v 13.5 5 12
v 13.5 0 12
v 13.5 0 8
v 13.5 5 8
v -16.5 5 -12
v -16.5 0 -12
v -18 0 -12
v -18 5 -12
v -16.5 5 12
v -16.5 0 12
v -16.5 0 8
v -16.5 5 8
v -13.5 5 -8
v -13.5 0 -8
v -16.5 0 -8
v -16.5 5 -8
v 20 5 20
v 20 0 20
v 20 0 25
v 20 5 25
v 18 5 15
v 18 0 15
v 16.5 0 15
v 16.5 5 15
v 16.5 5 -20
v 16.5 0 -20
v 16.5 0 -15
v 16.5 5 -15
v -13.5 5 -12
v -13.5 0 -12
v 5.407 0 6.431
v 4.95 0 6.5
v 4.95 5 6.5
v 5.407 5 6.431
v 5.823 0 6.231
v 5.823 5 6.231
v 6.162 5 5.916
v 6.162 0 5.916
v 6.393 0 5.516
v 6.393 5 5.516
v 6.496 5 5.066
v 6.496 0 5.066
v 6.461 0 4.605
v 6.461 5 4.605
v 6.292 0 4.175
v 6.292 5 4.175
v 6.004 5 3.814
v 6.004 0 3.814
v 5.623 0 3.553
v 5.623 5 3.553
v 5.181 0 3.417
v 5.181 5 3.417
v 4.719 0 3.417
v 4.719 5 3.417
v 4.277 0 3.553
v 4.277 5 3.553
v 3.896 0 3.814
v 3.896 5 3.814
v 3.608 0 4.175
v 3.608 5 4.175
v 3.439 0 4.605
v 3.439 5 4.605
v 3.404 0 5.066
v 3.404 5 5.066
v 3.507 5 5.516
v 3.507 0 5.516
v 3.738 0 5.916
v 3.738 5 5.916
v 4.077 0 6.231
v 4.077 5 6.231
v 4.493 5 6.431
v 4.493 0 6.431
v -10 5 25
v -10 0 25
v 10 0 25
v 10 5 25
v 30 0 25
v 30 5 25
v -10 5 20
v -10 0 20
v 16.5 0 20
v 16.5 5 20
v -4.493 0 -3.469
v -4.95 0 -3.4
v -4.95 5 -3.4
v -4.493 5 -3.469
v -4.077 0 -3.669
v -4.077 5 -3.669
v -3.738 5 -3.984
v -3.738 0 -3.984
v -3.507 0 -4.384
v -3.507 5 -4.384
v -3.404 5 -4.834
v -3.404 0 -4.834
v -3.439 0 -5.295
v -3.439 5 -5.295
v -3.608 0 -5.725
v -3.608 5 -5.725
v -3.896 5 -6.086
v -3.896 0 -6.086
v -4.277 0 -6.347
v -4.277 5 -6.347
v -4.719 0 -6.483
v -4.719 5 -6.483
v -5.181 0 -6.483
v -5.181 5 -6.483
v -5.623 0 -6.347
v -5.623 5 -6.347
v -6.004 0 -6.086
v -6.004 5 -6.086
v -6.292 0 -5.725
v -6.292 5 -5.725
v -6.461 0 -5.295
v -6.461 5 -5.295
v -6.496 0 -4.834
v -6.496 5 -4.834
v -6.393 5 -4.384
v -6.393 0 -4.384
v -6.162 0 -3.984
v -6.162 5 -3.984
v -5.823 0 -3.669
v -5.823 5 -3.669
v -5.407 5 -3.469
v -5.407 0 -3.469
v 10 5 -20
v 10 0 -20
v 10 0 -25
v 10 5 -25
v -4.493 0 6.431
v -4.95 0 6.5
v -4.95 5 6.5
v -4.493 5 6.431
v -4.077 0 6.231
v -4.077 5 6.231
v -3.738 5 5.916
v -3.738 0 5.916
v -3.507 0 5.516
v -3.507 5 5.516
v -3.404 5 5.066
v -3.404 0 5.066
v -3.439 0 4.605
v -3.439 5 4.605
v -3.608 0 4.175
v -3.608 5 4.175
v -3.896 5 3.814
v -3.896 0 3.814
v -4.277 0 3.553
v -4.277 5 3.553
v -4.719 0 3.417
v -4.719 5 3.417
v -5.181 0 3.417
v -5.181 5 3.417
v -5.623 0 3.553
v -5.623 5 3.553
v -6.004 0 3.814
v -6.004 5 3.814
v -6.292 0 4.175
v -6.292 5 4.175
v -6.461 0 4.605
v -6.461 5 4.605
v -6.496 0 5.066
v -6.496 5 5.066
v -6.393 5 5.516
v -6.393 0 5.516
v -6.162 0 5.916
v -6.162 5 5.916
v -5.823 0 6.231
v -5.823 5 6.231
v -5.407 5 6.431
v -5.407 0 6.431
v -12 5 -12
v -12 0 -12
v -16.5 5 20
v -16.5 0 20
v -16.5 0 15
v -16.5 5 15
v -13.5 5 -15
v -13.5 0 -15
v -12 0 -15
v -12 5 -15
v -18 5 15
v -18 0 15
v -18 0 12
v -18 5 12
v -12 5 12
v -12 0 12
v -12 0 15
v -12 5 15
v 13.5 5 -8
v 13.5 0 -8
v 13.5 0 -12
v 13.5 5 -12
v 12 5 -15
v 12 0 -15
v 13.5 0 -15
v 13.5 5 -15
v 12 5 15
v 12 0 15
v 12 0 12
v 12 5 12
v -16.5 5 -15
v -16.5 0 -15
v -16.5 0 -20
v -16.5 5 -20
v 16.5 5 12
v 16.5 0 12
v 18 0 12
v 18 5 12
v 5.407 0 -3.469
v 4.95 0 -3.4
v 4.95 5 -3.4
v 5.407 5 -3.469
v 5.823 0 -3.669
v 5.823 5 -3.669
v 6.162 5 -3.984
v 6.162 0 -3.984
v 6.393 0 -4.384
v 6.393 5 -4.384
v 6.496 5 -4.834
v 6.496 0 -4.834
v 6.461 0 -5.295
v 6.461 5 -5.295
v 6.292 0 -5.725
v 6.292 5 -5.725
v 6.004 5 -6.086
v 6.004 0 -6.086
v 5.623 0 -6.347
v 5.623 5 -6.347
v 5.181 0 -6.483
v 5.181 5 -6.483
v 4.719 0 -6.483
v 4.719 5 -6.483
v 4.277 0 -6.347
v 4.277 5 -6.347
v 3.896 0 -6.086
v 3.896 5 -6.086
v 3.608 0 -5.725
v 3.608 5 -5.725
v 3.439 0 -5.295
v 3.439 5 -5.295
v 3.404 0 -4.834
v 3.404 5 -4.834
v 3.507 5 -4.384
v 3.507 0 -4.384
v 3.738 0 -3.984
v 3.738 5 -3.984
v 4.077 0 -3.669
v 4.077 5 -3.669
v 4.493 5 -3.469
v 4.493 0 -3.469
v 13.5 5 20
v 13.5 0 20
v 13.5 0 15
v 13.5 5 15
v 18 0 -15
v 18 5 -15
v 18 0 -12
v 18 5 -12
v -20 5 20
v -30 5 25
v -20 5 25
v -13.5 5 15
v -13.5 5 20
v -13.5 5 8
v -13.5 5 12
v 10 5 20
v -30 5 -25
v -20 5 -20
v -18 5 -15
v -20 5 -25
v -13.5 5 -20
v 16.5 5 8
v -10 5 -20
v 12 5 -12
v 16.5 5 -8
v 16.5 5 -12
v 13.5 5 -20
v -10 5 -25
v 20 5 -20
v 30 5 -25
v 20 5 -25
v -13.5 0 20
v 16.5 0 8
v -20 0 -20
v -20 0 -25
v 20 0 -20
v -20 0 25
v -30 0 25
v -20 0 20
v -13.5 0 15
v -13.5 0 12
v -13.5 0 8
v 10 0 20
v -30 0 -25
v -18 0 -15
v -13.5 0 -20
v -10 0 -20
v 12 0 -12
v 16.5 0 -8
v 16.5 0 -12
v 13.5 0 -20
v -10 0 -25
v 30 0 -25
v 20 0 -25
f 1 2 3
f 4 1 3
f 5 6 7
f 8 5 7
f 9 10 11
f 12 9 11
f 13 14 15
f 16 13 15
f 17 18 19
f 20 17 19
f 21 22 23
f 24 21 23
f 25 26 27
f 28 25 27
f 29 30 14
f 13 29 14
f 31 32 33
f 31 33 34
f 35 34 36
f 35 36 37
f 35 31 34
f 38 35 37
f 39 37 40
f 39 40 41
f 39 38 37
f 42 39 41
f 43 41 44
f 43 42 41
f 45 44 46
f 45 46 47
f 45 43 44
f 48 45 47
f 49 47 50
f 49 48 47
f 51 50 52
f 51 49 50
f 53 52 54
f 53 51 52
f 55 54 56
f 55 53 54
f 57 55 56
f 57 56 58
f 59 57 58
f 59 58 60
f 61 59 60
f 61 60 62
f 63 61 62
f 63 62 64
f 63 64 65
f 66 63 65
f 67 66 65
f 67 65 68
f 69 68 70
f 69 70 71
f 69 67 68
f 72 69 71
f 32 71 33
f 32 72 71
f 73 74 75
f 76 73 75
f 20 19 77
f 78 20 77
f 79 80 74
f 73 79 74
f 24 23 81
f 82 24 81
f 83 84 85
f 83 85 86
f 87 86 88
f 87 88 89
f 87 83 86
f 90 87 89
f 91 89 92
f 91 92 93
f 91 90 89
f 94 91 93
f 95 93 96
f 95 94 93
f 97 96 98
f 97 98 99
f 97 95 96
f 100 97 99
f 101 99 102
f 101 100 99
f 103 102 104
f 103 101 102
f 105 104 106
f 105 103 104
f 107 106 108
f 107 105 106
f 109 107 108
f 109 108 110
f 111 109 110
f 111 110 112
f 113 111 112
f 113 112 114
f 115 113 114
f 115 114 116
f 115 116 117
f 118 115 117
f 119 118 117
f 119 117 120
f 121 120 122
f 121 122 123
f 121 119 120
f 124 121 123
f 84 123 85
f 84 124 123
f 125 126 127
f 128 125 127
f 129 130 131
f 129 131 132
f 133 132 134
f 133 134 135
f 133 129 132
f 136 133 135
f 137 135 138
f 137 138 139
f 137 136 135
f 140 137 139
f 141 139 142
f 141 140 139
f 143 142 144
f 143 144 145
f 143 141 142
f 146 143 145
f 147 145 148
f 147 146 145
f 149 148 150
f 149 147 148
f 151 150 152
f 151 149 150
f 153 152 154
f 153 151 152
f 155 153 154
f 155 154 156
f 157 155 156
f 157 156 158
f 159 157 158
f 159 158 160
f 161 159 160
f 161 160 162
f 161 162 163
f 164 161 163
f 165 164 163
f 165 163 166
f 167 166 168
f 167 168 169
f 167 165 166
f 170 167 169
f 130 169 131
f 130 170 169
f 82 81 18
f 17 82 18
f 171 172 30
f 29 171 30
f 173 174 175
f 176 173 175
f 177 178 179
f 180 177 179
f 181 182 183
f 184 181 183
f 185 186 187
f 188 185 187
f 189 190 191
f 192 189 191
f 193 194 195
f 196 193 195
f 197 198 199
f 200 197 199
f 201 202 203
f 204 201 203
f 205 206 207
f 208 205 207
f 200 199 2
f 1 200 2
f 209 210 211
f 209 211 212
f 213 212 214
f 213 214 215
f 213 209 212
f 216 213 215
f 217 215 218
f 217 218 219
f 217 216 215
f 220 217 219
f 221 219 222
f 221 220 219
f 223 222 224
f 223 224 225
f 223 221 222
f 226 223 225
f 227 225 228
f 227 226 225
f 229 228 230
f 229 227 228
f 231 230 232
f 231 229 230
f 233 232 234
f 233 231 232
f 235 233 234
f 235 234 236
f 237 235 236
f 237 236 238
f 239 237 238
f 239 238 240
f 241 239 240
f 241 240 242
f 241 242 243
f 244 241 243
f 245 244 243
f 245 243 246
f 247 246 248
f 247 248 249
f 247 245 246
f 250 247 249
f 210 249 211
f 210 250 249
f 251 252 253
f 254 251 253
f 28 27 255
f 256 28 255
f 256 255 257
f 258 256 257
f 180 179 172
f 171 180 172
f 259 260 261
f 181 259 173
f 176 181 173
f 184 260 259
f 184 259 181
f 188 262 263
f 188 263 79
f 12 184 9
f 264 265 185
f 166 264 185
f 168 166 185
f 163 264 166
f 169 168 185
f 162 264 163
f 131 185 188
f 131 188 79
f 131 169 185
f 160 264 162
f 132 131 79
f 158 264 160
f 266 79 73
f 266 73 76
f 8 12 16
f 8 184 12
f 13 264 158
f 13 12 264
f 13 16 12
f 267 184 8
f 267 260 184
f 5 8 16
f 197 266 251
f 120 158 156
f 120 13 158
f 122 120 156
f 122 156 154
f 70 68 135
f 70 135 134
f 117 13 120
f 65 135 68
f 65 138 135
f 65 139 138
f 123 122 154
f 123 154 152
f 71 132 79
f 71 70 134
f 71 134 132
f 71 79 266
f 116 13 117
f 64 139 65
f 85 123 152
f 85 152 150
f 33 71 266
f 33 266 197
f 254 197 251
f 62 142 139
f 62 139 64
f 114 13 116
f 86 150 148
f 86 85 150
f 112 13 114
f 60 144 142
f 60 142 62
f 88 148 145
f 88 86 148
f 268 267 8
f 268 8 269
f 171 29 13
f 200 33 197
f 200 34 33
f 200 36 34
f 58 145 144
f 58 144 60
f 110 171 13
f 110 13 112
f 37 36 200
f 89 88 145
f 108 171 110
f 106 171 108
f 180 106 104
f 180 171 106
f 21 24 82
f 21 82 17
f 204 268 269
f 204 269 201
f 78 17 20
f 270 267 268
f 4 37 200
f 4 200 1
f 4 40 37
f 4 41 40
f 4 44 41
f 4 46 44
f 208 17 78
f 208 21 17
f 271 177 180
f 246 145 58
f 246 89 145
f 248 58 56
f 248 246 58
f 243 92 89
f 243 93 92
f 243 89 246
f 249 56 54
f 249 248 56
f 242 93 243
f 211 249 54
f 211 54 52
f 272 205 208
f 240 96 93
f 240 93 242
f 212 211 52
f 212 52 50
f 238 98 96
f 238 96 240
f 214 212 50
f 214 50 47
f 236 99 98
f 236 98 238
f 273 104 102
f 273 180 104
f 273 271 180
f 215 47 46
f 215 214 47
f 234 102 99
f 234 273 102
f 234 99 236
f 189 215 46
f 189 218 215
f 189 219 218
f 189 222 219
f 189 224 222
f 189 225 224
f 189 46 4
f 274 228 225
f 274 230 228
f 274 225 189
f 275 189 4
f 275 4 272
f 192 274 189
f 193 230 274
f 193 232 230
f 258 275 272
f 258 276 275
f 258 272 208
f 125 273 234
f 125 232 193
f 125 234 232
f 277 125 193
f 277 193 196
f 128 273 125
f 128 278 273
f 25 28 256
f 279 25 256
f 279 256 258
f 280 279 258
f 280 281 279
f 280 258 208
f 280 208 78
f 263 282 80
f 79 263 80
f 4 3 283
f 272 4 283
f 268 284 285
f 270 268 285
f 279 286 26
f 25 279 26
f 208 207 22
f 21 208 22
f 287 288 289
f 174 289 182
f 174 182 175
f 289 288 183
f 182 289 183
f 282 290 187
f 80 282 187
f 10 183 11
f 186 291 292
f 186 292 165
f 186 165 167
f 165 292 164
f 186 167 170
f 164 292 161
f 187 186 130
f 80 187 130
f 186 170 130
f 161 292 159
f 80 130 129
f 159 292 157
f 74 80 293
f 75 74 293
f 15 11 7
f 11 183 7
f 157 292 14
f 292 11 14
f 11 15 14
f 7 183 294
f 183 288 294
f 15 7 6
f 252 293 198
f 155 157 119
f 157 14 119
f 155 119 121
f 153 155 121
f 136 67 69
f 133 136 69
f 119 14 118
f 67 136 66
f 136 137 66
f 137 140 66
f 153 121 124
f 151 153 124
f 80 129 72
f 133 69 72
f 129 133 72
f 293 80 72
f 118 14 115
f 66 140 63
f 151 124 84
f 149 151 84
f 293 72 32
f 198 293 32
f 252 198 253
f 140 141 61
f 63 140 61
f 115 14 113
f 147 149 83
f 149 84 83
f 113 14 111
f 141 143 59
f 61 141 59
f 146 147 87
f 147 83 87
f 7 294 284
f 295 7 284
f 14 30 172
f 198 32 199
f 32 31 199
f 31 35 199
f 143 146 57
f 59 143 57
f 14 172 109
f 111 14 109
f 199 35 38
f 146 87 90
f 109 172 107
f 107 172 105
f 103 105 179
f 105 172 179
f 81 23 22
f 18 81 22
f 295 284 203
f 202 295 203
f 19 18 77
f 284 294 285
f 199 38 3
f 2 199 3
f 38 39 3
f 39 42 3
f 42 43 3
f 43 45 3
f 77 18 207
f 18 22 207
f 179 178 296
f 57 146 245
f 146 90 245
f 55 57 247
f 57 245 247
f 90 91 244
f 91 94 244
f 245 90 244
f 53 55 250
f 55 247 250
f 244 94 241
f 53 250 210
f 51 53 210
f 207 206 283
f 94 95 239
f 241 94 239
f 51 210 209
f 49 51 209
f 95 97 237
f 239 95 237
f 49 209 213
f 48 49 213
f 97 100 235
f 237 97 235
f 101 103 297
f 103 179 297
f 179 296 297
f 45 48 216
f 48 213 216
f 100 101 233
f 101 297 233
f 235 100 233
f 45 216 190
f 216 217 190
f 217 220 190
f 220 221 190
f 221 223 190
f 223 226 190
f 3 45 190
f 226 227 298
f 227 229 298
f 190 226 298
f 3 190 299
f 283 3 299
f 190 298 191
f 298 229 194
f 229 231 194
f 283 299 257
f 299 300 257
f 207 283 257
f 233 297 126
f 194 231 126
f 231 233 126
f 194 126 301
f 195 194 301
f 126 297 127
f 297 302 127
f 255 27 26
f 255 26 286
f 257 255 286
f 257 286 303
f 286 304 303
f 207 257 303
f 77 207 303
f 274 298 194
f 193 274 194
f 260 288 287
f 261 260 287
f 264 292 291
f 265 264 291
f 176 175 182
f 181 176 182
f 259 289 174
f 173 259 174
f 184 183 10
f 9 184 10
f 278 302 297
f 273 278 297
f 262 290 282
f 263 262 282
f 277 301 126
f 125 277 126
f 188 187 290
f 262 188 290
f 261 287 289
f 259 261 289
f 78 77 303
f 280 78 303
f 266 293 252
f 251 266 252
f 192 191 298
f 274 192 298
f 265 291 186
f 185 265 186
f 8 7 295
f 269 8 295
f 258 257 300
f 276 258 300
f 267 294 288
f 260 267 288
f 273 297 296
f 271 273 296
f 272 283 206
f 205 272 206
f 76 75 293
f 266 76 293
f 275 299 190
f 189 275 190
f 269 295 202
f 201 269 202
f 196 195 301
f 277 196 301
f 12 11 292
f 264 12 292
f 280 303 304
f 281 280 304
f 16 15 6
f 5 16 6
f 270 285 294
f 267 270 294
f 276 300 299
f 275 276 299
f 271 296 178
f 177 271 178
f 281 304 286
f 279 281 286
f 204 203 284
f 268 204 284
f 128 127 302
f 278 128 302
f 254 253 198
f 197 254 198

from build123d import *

# Parameters (mm, degrees)
SKETCH1_R           = 1.55
BOSS_EXTRUDE1_DEPTH = 5


with BuildPart() as part:
    # Sketch1 → Boss-Extrude1 (new body)
    with BuildSketch(Plane(origin=(0, 0, 0), x_dir=(1, 0, 0), z_dir=(0, 1, 0))):
        Polygon((-30, 25), (-30, -25), (-20, -25), (-20, -20), (-16.5, -20), (-16.5, -15), (-18, -15), (-18, -12), (-16.5, -12), (-16.5, -8), (-13.5, -8), (-13.5, -12), (-12, -12), (-12, -15), (-13.5, -15), (-13.5, -20), (-10, -20), (-10, -25), (10, -25), (10, -20), (13.5, -20), (13.5, -15), (12, -15), (12, -12), (13.5, -12), (13.5, -8), (16.5, -8), (16.5, -12), (18, -12), (18, -15), (16.5, -15), (16.5, -20), (20, -20), (20, -25), (30, -25), (30, 25), (20, 25), (20, 20), (16.5, 20), (16.5, 15), (18, 15), (18, 12), (16.5, 12), (16.5, 8), (13.5, 8), (13.5, 12), (12, 12), (12, 15), (13.5, 15), (13.5, 20), (10, 20), (10, 25), (-10, 25), (-10, 20), (-13.5, 20), (-13.5, 15), (-12, 15), (-12, 12), (-13.5, 12), (-13.5, 8), (-16.5, 8), (-16.5, 12), (-18, 12), (-18, 15), (-16.5, 15), (-16.5, 20), (-20, 20), (-20, 25), align=None)
        with Locations(Location((4.95, 4.95, 0), (0, 0, 270))):
            Circle(SKETCH1_R, mode=Mode.SUBTRACT)
        with Locations(Location((-4.95, -4.95, 0), (0, 0, 270))):
            Circle(SKETCH1_R, mode=Mode.SUBTRACT)
        with Locations(Location((4.95, -4.95, 0), (0, 0, 270))):
            Circle(SKETCH1_R, mode=Mode.SUBTRACT)
        with Locations(Location((-4.95, 4.95, 0), (0, 0, 270))):
            Circle(SKETCH1_R, mode=Mode.SUBTRACT)
    extrude(amount=BOSS_EXTRUDE1_DEPTH)


solid = part.part
